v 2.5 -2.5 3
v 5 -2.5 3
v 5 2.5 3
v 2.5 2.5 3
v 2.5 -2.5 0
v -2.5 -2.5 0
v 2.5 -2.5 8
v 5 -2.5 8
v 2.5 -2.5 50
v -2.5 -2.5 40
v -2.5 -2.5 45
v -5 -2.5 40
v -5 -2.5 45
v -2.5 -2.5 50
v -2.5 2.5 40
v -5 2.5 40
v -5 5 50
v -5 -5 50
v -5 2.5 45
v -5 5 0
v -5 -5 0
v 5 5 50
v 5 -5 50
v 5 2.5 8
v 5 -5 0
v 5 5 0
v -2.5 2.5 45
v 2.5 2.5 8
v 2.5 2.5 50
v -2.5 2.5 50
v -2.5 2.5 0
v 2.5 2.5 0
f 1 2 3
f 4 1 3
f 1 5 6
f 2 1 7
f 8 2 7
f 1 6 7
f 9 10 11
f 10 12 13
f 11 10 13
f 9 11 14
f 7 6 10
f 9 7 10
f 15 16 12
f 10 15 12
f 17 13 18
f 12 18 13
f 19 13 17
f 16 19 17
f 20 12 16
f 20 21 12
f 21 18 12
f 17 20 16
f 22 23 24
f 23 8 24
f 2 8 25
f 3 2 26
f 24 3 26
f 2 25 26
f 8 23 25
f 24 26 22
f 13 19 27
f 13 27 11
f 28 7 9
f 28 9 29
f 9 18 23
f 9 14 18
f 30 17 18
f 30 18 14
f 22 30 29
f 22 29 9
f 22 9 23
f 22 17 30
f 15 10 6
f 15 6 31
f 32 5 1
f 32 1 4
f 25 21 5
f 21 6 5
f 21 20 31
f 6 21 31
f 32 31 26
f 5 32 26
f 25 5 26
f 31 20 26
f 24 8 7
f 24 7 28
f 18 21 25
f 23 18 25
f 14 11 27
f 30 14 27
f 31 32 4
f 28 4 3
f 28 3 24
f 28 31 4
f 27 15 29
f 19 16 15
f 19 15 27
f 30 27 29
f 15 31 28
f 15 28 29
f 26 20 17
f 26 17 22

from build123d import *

# Parameters (mm, degrees)
F0_W       = 10
F0_H       = 10
F0_W_2     = 5
F0_H_2     = 5
F1_DEPTH   = 50
F2_W       = 5
F2_H       = 5
F1_FACE1_W = 10
F1_FACE1_H = 50
F3_DEPTH   = 3
F4_W       = 5
F4_H       = 5
F5_DEPTH   = 4


with BuildPart() as f1:
    # F0 (on Top) → F1 (new body)
    with BuildSketch(Plane.XY):
        Rectangle(F0_W, F0_H)
        Rectangle(F0_W_2, F0_H_2, mode=Mode.SUBTRACT)
    extrude(amount=F1_DEPTH)

    # F2 (on face) + F1_face1 (on face) → F3 (cut)
    with BuildSketch(Plane.YZ.offset(5)):
        with Locations((0, 5.5)):
            Rectangle(F2_W, F2_H)
    with BuildSketch(Plane(origin=(-5, 0, 25), x_dir=(0, -1, 0), z_dir=(-1, 0, 0))):
        Rectangle(F1_FACE1_W, F1_FACE1_H)
    extrude(amount=-F3_DEPTH, dir=(1, 0, 0), mode=Mode.SUBTRACT)

    # F4 (on face) → F5 (cut)
    with BuildSketch(Plane(origin=(-5, 0, 0), x_dir=(0, -1, 0), z_dir=(-1, 0, 0))):
        with Locations((0, 42.5)):
            Rectangle(F4_W, F4_H)
    extrude(amount=-F5_DEPTH, mode=Mode.SUBTRACT)


solid = f1.part
